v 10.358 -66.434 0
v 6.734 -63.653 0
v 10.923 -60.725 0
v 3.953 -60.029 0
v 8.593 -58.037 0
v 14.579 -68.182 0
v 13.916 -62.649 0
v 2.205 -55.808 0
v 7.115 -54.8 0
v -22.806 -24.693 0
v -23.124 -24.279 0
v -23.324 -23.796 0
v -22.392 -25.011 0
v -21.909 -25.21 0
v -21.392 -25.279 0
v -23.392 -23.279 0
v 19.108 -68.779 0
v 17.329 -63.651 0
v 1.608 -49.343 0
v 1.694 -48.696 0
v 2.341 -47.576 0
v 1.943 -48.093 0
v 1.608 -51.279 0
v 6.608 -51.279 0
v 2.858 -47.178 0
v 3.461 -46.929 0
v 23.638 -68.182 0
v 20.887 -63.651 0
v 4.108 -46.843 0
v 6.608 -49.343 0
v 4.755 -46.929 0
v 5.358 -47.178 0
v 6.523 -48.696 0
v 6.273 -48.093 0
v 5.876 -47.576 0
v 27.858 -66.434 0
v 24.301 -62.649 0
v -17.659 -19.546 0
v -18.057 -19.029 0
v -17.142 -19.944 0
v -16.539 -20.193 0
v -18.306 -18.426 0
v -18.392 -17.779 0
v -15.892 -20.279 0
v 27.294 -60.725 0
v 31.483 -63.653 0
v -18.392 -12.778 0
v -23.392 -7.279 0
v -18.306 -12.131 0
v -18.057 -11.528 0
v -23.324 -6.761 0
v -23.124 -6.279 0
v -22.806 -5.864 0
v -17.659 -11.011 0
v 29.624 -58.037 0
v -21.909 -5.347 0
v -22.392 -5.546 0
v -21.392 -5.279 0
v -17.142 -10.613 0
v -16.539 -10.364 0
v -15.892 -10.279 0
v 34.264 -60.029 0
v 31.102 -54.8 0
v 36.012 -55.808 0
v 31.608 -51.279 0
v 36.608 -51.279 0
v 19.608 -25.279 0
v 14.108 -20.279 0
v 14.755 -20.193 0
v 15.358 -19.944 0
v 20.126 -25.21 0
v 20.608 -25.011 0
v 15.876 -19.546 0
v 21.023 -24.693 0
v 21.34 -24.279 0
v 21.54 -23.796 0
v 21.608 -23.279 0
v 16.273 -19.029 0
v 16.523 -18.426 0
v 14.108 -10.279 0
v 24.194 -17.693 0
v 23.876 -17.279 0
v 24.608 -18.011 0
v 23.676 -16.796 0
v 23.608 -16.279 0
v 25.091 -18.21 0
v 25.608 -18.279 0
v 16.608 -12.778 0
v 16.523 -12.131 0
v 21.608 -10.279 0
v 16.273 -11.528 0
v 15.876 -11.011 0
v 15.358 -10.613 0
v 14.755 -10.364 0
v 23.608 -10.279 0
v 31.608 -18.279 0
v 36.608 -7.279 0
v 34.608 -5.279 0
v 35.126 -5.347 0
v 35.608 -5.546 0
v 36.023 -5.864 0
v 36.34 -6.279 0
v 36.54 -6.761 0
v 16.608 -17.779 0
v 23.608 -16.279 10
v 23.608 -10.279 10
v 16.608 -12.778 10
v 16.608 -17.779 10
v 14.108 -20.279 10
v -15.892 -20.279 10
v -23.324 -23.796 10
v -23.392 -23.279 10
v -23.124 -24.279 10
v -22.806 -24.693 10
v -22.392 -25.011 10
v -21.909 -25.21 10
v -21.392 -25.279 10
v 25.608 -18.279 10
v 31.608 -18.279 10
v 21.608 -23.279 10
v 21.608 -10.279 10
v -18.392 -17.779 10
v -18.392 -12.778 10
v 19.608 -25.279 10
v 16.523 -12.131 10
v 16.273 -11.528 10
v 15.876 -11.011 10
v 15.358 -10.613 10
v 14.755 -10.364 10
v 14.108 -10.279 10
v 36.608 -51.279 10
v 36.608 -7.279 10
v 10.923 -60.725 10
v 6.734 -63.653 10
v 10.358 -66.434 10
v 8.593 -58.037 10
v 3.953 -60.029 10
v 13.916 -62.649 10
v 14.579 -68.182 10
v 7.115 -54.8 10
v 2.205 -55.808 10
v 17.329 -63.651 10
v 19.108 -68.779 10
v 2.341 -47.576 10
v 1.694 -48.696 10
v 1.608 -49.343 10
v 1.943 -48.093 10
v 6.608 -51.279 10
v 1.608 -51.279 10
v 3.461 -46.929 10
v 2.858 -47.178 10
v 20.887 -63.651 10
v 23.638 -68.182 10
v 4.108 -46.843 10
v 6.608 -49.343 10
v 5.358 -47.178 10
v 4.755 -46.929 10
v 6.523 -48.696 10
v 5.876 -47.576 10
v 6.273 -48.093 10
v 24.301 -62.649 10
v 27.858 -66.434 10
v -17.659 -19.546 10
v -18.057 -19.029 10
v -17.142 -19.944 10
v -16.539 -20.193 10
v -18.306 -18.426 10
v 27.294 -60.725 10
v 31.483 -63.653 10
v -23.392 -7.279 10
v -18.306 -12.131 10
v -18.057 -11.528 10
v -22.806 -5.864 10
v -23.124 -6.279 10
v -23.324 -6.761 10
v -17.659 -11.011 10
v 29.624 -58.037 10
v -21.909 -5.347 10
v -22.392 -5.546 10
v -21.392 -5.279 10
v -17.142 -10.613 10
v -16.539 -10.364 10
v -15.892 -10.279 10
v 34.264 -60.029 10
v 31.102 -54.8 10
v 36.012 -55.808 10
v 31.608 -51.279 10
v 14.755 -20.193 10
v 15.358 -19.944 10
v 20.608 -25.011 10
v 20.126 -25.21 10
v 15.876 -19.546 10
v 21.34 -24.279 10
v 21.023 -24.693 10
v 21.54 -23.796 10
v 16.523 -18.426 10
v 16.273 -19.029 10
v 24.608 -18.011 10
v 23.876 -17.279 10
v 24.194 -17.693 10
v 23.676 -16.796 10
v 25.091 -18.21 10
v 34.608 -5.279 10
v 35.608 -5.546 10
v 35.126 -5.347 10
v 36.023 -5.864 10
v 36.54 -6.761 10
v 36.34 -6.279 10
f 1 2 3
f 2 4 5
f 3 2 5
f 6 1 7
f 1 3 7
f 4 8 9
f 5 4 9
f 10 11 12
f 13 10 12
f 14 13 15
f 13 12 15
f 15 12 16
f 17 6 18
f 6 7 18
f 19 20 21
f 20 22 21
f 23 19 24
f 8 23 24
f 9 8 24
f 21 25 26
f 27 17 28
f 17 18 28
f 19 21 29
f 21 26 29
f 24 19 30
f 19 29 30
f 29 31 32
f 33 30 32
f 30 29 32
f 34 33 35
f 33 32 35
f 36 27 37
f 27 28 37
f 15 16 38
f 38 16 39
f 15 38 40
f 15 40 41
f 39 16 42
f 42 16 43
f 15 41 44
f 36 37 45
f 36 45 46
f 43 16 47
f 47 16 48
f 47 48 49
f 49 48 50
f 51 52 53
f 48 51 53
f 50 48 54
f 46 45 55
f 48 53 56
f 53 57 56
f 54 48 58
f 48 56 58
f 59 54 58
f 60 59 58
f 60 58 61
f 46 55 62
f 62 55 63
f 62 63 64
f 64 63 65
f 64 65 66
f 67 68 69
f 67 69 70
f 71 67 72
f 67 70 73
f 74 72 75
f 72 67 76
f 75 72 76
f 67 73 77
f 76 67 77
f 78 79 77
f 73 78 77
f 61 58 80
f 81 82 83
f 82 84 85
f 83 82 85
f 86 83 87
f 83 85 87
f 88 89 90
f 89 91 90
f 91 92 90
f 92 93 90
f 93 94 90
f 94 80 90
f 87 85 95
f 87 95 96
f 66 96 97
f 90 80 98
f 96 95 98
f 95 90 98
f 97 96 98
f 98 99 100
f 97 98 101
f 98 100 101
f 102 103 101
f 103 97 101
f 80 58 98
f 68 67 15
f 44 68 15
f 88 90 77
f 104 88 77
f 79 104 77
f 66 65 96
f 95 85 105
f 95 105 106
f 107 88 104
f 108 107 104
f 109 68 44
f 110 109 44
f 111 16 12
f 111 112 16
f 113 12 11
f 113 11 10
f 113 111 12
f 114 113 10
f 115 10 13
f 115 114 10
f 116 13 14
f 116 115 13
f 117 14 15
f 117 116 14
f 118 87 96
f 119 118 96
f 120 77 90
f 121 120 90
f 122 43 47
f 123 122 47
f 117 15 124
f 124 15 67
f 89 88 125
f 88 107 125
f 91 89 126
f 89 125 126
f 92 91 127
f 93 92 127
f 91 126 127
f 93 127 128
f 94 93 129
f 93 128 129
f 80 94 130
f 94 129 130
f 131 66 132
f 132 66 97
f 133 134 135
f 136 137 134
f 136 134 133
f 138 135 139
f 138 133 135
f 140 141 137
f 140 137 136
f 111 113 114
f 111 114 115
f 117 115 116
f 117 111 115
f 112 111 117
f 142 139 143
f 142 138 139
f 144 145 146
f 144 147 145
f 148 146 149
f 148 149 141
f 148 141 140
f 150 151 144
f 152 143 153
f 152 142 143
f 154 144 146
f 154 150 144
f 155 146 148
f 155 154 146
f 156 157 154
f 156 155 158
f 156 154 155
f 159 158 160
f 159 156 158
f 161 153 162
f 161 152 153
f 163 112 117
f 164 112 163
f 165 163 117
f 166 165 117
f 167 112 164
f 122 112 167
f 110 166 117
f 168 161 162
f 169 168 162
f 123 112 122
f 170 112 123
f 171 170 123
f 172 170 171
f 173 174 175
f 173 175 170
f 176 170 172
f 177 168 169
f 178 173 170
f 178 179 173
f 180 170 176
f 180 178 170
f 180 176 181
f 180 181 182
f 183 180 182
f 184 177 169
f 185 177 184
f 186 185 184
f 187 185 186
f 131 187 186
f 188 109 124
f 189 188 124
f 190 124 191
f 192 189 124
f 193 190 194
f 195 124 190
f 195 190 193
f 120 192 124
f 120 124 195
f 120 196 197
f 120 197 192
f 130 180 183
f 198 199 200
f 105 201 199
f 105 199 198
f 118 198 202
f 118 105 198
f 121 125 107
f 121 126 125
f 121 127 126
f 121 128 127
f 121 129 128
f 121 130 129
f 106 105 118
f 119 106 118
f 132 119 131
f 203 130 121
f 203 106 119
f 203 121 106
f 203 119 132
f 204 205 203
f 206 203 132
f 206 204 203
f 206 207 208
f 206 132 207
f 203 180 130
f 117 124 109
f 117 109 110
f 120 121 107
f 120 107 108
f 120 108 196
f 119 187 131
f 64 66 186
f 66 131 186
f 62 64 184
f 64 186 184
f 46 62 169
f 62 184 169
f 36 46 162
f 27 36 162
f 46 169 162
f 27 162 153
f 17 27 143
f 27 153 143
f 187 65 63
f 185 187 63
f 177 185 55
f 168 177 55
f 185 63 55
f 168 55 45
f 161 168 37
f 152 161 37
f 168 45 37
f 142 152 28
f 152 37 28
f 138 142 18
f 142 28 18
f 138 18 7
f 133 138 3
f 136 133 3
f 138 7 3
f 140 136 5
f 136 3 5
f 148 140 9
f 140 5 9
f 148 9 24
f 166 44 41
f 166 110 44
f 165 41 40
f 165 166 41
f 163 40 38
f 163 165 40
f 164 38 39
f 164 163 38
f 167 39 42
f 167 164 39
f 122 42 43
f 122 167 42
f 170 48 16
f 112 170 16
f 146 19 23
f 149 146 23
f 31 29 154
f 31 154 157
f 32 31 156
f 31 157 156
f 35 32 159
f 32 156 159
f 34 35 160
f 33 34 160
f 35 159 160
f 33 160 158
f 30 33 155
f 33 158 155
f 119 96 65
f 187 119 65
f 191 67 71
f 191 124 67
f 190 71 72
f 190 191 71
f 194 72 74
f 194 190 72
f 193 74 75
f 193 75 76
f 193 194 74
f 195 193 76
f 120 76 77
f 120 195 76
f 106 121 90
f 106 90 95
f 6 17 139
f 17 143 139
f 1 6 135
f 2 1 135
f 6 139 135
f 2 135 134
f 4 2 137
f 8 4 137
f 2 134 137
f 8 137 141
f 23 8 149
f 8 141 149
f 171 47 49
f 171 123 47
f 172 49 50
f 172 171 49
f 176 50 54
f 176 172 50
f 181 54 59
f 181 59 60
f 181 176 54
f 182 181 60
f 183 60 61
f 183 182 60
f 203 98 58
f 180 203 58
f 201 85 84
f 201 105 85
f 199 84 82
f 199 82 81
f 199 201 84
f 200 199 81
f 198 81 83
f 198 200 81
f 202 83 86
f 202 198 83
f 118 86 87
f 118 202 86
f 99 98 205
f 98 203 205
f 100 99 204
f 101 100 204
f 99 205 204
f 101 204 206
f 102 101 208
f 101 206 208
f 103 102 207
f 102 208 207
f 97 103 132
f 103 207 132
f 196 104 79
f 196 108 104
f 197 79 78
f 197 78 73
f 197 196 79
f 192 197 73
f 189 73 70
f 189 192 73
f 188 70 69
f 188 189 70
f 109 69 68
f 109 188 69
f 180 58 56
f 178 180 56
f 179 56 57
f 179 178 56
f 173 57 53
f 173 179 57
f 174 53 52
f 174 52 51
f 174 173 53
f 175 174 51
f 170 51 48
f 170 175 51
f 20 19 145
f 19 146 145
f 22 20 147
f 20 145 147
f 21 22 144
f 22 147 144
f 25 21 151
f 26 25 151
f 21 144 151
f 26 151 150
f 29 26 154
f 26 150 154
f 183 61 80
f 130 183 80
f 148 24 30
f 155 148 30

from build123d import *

# Parameters (mm, degrees)
F0_W     = 8
F0_H     = 8
F1_DEPTH = 10
F2_R     = 2
F3_R     = 17.49999
F4_R     = 2.49999


# Not quite as in the source:
# - a fillet or chamfer is up to 0.001 mm smaller than in the source, because OpenCascade refuses the exact size
# - a feature names something its author has since deleted; it is built from what else it names


with BuildPart() as f1:
    # F0 (on Top) → F1 (new body)
    with BuildSketch(Plane.XY):
        Polygon((-18.3916796818, -10.2785023413), (-23.3916796818, -10.2785023413), (-23.3916796818, -25.2785023413), (21.6083203182, -25.2785023413), (21.6083203182, -18.2785023413), (21.6083203182, -10.2785023413), (16.6083203182, -10.2785023413), (16.6083203182, -20.2785023413), (-18.3916796818, -20.2785023413), align=None)
        Polygon((-23.3916796818, -5.2785023413), (-23.3916796818, -10.2785023413), (-18.3916796818, -10.2785023413), (16.6083203182, -10.2785023413), (21.6083203182, -10.2785023413), (23.6083203182, -10.2785023413), (31.6083203182, -10.2785023413), (36.6083203182, -10.2785023413), (36.6083203182, -5.2785023413), align=None)
        with Locations((27.6083203182, -14.2785023413)):
            Rectangle(F0_W, F0_H)
        Polygon((36.6083203182, -36.2785023413), (36.6083203182, -10.2785023413), (31.6083203182, -10.2785023413), (31.6083203182, -18.2785023413), (31.6083203182, -36.2785023413), align=None)
        with BuildLine():
            Line((36.6083203182, -68.7785023413), (36.6083203182, -36.2785023413))
            Line((36.6083203182, -36.2785023413), (31.6083203182, -36.2785023413))
            Line((31.6083203182, -36.2785023413), (31.6083203182, -46.8433834612))
            Line((31.6083203182, -46.8433834612), (31.6083203182, -51.2785023413))
            ThreePointArc((31.6083203182, -51.2785023413), (19.1083203182, -63.7785023413), (6.6083203182, -51.2785023413))
            Line((6.6083203182, -51.2785023413), (6.6083203182, -46.8433834612))
            Line((6.6083203182, -46.8433834612), (1.6083203182, -46.8433834612))
            Line((1.6083203182, -46.8433834612), (1.6083203182, -68.7785023413))
            Line((1.6083203182, -68.7785023413), (36.6083203182, -68.7785023413))
        make_face()
    extrude(amount=F1_DEPTH)

    # F2
    f2_edges = [f1.edges().sort_by_distance(p)[0] for p in [
        (-23.39168, -25.278502, 5),
        (21.60832, -25.278502, 5),
        (23.60832, -18.278502, 5),
        (36.60832, -5.278502, 5),
        (-23.39168, -5.278502, 5),
    ]]
    fillet(f2_edges, radius=F2_R)

    # F3 (radius 17.5 in the source; OpenCascade refuses exactly that, so slightly less here)
    f3_edges = [f1.edges().sort_by_distance(p)[0] for p in [
        (1.60832, -68.778502, 5),
        (36.60832, -68.778502, 5),
    ]]
    fillet(f3_edges, radius=F3_R)

    # F4 (radius 2.5 in the source; OpenCascade refuses exactly that, so slightly less here)
    f4_edges = [f1.edges().sort_by_distance(p)[0] for p in [
        (1.60832, -46.843383, 5),
        (6.60832, -46.843383, 5),
        (-18.39168, -20.278502, 5),
        (-18.39168, -10.278502, 5),
        (16.60832, -10.278502, 5),
        (16.60832, -20.278502, 5),
    ]]
    fillet(f4_edges, radius=F4_R)


solid = f1.part
